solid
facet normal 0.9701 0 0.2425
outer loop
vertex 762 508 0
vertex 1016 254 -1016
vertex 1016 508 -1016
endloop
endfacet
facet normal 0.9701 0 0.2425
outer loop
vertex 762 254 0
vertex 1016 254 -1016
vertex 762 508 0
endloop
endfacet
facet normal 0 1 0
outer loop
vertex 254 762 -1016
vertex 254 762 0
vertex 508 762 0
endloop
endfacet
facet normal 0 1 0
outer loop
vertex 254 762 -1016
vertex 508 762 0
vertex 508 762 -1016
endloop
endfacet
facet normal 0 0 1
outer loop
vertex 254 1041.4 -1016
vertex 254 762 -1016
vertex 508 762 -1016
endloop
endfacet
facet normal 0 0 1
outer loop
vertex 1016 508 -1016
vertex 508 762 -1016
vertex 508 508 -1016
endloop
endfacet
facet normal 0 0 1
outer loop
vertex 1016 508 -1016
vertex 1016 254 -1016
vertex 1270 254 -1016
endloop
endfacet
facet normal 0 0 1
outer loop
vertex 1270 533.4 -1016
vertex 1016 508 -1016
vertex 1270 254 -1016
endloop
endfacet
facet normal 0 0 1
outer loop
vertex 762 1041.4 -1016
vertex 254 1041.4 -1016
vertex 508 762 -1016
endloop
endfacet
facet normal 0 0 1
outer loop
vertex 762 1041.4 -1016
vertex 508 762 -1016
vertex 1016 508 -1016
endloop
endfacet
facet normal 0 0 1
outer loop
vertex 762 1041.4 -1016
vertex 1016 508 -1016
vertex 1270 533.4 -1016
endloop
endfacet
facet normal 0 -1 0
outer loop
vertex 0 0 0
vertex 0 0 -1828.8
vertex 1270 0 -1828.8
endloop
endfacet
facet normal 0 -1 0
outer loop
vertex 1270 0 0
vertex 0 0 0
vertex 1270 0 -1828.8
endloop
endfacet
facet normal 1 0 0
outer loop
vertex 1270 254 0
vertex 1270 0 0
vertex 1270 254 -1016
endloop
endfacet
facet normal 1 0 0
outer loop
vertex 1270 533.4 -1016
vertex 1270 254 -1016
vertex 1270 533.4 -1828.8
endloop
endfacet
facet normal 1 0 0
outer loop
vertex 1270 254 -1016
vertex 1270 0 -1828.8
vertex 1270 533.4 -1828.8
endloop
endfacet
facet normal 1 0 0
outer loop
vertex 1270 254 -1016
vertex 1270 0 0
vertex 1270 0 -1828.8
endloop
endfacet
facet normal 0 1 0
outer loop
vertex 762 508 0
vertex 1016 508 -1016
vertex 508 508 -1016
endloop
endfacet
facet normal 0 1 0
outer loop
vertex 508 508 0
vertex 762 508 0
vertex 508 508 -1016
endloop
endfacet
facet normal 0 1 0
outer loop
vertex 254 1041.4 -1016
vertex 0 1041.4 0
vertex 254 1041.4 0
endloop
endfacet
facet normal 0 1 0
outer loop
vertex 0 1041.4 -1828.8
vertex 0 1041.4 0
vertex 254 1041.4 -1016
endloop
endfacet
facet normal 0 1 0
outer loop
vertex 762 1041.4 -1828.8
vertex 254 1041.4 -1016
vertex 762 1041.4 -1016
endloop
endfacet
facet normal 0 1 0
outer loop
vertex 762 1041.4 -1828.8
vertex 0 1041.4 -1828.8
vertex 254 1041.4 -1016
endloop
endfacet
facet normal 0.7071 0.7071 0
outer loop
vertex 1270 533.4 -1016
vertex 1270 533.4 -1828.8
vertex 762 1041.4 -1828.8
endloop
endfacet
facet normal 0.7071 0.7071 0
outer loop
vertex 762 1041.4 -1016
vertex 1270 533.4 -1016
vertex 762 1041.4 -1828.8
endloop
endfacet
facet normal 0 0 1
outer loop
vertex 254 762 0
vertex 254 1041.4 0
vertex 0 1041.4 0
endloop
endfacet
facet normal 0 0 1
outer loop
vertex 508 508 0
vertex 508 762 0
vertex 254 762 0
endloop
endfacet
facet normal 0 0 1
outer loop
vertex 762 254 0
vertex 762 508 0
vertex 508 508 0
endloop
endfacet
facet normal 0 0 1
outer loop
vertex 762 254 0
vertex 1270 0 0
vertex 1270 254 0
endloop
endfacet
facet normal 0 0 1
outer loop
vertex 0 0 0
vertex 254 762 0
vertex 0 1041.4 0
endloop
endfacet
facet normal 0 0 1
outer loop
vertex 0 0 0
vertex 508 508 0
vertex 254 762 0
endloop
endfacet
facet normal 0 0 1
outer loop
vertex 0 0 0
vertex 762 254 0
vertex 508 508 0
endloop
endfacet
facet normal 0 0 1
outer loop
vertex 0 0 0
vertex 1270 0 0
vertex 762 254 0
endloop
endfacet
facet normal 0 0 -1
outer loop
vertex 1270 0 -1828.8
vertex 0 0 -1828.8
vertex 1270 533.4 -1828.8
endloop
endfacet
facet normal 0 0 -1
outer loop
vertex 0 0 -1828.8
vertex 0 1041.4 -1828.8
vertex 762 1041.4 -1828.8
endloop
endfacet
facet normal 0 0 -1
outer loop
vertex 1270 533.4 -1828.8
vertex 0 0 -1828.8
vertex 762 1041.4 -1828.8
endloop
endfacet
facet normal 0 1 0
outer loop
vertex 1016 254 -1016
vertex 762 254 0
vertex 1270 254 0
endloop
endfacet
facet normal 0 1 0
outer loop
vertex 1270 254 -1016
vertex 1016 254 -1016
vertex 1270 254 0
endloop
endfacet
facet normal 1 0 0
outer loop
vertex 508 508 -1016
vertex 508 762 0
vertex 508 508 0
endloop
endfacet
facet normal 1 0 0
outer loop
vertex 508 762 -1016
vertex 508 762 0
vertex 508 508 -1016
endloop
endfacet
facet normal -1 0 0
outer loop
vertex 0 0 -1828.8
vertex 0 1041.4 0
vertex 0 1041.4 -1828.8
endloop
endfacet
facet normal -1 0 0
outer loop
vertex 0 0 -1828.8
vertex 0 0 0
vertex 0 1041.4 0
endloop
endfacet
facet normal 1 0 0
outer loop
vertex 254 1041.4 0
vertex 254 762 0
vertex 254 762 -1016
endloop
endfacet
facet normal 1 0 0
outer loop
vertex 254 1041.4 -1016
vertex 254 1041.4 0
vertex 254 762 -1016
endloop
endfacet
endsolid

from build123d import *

# Parameters (mm, degrees)
SKETCH1_W           = 1270
SKETCH1_H           = 1828.8
BOSS_EXTRUDE1_DEPTH = 254
BOSS_EXTRUDE2_DEPTH = 812.8
SKETCH3_W           = 254
SKETCH3_H           = 1016
BOSS_EXTRUDE4_DEPTH = 787.4
SKETCH6_W           = 1016
SKETCH6_H           = 508
BOSS_EXTRUDE5_DEPTH = 254
BOSS_EXTRUDE6_DEPTH = 254


with BuildPart() as part:
    # Sketch1 → Boss-Extrude1 (new body)
    with BuildSketch(Plane(origin=(0, 0, 0), x_dir=(1, 0, 0), z_dir=(0, 1, 0))):
        with Locations((635, 914.4)):
            Rectangle(SKETCH1_W, SKETCH1_H)
    extrude(amount=BOSS_EXTRUDE1_DEPTH)

    # Sketch2 → Boss-Extrude2 (add)
    with BuildSketch(Plane(origin=(0, 0, -1828.8), x_dir=(-1, 0, 0), z_dir=(0, 0, -1))):
        Polygon((-1270, 254), (-1270, 533.4), (-762, 1041.4), (0, 1041.4), (0, 254), align=None)
    extrude(amount=-BOSS_EXTRUDE2_DEPTH)

    # Sketch3 → Boss-Extrude4 (add)
    with BuildSketch(Plane(origin=(0, 254, 0), x_dir=(1, 0, 0), z_dir=(0, 1, 0))):
        with Locations((127, 508)):
            Rectangle(SKETCH3_W, SKETCH3_H)
    extrude(amount=BOSS_EXTRUDE4_DEPTH)

    # Sketch6 → Boss-Extrude5 (add)
    with BuildSketch(Plane(origin=(254, 0, 0), x_dir=(0, 0, -1), z_dir=(1, 0, 0))):
        with Locations((508, 508)):
            Rectangle(SKETCH6_W, SKETCH6_H)
    extrude(amount=BOSS_EXTRUDE5_DEPTH)

    # Sketch7 → Boss-Extrude6 (add)
    with BuildSketch(Plane(origin=(0, 254, 0), x_dir=(1, 0, 0), z_dir=(0, 1, 0))):
        Polygon((508, 1016), (1016, 1016), (762, 0), (508, 0), align=None)
    extrude(amount=BOSS_EXTRUDE6_DEPTH)


solid = part.part
